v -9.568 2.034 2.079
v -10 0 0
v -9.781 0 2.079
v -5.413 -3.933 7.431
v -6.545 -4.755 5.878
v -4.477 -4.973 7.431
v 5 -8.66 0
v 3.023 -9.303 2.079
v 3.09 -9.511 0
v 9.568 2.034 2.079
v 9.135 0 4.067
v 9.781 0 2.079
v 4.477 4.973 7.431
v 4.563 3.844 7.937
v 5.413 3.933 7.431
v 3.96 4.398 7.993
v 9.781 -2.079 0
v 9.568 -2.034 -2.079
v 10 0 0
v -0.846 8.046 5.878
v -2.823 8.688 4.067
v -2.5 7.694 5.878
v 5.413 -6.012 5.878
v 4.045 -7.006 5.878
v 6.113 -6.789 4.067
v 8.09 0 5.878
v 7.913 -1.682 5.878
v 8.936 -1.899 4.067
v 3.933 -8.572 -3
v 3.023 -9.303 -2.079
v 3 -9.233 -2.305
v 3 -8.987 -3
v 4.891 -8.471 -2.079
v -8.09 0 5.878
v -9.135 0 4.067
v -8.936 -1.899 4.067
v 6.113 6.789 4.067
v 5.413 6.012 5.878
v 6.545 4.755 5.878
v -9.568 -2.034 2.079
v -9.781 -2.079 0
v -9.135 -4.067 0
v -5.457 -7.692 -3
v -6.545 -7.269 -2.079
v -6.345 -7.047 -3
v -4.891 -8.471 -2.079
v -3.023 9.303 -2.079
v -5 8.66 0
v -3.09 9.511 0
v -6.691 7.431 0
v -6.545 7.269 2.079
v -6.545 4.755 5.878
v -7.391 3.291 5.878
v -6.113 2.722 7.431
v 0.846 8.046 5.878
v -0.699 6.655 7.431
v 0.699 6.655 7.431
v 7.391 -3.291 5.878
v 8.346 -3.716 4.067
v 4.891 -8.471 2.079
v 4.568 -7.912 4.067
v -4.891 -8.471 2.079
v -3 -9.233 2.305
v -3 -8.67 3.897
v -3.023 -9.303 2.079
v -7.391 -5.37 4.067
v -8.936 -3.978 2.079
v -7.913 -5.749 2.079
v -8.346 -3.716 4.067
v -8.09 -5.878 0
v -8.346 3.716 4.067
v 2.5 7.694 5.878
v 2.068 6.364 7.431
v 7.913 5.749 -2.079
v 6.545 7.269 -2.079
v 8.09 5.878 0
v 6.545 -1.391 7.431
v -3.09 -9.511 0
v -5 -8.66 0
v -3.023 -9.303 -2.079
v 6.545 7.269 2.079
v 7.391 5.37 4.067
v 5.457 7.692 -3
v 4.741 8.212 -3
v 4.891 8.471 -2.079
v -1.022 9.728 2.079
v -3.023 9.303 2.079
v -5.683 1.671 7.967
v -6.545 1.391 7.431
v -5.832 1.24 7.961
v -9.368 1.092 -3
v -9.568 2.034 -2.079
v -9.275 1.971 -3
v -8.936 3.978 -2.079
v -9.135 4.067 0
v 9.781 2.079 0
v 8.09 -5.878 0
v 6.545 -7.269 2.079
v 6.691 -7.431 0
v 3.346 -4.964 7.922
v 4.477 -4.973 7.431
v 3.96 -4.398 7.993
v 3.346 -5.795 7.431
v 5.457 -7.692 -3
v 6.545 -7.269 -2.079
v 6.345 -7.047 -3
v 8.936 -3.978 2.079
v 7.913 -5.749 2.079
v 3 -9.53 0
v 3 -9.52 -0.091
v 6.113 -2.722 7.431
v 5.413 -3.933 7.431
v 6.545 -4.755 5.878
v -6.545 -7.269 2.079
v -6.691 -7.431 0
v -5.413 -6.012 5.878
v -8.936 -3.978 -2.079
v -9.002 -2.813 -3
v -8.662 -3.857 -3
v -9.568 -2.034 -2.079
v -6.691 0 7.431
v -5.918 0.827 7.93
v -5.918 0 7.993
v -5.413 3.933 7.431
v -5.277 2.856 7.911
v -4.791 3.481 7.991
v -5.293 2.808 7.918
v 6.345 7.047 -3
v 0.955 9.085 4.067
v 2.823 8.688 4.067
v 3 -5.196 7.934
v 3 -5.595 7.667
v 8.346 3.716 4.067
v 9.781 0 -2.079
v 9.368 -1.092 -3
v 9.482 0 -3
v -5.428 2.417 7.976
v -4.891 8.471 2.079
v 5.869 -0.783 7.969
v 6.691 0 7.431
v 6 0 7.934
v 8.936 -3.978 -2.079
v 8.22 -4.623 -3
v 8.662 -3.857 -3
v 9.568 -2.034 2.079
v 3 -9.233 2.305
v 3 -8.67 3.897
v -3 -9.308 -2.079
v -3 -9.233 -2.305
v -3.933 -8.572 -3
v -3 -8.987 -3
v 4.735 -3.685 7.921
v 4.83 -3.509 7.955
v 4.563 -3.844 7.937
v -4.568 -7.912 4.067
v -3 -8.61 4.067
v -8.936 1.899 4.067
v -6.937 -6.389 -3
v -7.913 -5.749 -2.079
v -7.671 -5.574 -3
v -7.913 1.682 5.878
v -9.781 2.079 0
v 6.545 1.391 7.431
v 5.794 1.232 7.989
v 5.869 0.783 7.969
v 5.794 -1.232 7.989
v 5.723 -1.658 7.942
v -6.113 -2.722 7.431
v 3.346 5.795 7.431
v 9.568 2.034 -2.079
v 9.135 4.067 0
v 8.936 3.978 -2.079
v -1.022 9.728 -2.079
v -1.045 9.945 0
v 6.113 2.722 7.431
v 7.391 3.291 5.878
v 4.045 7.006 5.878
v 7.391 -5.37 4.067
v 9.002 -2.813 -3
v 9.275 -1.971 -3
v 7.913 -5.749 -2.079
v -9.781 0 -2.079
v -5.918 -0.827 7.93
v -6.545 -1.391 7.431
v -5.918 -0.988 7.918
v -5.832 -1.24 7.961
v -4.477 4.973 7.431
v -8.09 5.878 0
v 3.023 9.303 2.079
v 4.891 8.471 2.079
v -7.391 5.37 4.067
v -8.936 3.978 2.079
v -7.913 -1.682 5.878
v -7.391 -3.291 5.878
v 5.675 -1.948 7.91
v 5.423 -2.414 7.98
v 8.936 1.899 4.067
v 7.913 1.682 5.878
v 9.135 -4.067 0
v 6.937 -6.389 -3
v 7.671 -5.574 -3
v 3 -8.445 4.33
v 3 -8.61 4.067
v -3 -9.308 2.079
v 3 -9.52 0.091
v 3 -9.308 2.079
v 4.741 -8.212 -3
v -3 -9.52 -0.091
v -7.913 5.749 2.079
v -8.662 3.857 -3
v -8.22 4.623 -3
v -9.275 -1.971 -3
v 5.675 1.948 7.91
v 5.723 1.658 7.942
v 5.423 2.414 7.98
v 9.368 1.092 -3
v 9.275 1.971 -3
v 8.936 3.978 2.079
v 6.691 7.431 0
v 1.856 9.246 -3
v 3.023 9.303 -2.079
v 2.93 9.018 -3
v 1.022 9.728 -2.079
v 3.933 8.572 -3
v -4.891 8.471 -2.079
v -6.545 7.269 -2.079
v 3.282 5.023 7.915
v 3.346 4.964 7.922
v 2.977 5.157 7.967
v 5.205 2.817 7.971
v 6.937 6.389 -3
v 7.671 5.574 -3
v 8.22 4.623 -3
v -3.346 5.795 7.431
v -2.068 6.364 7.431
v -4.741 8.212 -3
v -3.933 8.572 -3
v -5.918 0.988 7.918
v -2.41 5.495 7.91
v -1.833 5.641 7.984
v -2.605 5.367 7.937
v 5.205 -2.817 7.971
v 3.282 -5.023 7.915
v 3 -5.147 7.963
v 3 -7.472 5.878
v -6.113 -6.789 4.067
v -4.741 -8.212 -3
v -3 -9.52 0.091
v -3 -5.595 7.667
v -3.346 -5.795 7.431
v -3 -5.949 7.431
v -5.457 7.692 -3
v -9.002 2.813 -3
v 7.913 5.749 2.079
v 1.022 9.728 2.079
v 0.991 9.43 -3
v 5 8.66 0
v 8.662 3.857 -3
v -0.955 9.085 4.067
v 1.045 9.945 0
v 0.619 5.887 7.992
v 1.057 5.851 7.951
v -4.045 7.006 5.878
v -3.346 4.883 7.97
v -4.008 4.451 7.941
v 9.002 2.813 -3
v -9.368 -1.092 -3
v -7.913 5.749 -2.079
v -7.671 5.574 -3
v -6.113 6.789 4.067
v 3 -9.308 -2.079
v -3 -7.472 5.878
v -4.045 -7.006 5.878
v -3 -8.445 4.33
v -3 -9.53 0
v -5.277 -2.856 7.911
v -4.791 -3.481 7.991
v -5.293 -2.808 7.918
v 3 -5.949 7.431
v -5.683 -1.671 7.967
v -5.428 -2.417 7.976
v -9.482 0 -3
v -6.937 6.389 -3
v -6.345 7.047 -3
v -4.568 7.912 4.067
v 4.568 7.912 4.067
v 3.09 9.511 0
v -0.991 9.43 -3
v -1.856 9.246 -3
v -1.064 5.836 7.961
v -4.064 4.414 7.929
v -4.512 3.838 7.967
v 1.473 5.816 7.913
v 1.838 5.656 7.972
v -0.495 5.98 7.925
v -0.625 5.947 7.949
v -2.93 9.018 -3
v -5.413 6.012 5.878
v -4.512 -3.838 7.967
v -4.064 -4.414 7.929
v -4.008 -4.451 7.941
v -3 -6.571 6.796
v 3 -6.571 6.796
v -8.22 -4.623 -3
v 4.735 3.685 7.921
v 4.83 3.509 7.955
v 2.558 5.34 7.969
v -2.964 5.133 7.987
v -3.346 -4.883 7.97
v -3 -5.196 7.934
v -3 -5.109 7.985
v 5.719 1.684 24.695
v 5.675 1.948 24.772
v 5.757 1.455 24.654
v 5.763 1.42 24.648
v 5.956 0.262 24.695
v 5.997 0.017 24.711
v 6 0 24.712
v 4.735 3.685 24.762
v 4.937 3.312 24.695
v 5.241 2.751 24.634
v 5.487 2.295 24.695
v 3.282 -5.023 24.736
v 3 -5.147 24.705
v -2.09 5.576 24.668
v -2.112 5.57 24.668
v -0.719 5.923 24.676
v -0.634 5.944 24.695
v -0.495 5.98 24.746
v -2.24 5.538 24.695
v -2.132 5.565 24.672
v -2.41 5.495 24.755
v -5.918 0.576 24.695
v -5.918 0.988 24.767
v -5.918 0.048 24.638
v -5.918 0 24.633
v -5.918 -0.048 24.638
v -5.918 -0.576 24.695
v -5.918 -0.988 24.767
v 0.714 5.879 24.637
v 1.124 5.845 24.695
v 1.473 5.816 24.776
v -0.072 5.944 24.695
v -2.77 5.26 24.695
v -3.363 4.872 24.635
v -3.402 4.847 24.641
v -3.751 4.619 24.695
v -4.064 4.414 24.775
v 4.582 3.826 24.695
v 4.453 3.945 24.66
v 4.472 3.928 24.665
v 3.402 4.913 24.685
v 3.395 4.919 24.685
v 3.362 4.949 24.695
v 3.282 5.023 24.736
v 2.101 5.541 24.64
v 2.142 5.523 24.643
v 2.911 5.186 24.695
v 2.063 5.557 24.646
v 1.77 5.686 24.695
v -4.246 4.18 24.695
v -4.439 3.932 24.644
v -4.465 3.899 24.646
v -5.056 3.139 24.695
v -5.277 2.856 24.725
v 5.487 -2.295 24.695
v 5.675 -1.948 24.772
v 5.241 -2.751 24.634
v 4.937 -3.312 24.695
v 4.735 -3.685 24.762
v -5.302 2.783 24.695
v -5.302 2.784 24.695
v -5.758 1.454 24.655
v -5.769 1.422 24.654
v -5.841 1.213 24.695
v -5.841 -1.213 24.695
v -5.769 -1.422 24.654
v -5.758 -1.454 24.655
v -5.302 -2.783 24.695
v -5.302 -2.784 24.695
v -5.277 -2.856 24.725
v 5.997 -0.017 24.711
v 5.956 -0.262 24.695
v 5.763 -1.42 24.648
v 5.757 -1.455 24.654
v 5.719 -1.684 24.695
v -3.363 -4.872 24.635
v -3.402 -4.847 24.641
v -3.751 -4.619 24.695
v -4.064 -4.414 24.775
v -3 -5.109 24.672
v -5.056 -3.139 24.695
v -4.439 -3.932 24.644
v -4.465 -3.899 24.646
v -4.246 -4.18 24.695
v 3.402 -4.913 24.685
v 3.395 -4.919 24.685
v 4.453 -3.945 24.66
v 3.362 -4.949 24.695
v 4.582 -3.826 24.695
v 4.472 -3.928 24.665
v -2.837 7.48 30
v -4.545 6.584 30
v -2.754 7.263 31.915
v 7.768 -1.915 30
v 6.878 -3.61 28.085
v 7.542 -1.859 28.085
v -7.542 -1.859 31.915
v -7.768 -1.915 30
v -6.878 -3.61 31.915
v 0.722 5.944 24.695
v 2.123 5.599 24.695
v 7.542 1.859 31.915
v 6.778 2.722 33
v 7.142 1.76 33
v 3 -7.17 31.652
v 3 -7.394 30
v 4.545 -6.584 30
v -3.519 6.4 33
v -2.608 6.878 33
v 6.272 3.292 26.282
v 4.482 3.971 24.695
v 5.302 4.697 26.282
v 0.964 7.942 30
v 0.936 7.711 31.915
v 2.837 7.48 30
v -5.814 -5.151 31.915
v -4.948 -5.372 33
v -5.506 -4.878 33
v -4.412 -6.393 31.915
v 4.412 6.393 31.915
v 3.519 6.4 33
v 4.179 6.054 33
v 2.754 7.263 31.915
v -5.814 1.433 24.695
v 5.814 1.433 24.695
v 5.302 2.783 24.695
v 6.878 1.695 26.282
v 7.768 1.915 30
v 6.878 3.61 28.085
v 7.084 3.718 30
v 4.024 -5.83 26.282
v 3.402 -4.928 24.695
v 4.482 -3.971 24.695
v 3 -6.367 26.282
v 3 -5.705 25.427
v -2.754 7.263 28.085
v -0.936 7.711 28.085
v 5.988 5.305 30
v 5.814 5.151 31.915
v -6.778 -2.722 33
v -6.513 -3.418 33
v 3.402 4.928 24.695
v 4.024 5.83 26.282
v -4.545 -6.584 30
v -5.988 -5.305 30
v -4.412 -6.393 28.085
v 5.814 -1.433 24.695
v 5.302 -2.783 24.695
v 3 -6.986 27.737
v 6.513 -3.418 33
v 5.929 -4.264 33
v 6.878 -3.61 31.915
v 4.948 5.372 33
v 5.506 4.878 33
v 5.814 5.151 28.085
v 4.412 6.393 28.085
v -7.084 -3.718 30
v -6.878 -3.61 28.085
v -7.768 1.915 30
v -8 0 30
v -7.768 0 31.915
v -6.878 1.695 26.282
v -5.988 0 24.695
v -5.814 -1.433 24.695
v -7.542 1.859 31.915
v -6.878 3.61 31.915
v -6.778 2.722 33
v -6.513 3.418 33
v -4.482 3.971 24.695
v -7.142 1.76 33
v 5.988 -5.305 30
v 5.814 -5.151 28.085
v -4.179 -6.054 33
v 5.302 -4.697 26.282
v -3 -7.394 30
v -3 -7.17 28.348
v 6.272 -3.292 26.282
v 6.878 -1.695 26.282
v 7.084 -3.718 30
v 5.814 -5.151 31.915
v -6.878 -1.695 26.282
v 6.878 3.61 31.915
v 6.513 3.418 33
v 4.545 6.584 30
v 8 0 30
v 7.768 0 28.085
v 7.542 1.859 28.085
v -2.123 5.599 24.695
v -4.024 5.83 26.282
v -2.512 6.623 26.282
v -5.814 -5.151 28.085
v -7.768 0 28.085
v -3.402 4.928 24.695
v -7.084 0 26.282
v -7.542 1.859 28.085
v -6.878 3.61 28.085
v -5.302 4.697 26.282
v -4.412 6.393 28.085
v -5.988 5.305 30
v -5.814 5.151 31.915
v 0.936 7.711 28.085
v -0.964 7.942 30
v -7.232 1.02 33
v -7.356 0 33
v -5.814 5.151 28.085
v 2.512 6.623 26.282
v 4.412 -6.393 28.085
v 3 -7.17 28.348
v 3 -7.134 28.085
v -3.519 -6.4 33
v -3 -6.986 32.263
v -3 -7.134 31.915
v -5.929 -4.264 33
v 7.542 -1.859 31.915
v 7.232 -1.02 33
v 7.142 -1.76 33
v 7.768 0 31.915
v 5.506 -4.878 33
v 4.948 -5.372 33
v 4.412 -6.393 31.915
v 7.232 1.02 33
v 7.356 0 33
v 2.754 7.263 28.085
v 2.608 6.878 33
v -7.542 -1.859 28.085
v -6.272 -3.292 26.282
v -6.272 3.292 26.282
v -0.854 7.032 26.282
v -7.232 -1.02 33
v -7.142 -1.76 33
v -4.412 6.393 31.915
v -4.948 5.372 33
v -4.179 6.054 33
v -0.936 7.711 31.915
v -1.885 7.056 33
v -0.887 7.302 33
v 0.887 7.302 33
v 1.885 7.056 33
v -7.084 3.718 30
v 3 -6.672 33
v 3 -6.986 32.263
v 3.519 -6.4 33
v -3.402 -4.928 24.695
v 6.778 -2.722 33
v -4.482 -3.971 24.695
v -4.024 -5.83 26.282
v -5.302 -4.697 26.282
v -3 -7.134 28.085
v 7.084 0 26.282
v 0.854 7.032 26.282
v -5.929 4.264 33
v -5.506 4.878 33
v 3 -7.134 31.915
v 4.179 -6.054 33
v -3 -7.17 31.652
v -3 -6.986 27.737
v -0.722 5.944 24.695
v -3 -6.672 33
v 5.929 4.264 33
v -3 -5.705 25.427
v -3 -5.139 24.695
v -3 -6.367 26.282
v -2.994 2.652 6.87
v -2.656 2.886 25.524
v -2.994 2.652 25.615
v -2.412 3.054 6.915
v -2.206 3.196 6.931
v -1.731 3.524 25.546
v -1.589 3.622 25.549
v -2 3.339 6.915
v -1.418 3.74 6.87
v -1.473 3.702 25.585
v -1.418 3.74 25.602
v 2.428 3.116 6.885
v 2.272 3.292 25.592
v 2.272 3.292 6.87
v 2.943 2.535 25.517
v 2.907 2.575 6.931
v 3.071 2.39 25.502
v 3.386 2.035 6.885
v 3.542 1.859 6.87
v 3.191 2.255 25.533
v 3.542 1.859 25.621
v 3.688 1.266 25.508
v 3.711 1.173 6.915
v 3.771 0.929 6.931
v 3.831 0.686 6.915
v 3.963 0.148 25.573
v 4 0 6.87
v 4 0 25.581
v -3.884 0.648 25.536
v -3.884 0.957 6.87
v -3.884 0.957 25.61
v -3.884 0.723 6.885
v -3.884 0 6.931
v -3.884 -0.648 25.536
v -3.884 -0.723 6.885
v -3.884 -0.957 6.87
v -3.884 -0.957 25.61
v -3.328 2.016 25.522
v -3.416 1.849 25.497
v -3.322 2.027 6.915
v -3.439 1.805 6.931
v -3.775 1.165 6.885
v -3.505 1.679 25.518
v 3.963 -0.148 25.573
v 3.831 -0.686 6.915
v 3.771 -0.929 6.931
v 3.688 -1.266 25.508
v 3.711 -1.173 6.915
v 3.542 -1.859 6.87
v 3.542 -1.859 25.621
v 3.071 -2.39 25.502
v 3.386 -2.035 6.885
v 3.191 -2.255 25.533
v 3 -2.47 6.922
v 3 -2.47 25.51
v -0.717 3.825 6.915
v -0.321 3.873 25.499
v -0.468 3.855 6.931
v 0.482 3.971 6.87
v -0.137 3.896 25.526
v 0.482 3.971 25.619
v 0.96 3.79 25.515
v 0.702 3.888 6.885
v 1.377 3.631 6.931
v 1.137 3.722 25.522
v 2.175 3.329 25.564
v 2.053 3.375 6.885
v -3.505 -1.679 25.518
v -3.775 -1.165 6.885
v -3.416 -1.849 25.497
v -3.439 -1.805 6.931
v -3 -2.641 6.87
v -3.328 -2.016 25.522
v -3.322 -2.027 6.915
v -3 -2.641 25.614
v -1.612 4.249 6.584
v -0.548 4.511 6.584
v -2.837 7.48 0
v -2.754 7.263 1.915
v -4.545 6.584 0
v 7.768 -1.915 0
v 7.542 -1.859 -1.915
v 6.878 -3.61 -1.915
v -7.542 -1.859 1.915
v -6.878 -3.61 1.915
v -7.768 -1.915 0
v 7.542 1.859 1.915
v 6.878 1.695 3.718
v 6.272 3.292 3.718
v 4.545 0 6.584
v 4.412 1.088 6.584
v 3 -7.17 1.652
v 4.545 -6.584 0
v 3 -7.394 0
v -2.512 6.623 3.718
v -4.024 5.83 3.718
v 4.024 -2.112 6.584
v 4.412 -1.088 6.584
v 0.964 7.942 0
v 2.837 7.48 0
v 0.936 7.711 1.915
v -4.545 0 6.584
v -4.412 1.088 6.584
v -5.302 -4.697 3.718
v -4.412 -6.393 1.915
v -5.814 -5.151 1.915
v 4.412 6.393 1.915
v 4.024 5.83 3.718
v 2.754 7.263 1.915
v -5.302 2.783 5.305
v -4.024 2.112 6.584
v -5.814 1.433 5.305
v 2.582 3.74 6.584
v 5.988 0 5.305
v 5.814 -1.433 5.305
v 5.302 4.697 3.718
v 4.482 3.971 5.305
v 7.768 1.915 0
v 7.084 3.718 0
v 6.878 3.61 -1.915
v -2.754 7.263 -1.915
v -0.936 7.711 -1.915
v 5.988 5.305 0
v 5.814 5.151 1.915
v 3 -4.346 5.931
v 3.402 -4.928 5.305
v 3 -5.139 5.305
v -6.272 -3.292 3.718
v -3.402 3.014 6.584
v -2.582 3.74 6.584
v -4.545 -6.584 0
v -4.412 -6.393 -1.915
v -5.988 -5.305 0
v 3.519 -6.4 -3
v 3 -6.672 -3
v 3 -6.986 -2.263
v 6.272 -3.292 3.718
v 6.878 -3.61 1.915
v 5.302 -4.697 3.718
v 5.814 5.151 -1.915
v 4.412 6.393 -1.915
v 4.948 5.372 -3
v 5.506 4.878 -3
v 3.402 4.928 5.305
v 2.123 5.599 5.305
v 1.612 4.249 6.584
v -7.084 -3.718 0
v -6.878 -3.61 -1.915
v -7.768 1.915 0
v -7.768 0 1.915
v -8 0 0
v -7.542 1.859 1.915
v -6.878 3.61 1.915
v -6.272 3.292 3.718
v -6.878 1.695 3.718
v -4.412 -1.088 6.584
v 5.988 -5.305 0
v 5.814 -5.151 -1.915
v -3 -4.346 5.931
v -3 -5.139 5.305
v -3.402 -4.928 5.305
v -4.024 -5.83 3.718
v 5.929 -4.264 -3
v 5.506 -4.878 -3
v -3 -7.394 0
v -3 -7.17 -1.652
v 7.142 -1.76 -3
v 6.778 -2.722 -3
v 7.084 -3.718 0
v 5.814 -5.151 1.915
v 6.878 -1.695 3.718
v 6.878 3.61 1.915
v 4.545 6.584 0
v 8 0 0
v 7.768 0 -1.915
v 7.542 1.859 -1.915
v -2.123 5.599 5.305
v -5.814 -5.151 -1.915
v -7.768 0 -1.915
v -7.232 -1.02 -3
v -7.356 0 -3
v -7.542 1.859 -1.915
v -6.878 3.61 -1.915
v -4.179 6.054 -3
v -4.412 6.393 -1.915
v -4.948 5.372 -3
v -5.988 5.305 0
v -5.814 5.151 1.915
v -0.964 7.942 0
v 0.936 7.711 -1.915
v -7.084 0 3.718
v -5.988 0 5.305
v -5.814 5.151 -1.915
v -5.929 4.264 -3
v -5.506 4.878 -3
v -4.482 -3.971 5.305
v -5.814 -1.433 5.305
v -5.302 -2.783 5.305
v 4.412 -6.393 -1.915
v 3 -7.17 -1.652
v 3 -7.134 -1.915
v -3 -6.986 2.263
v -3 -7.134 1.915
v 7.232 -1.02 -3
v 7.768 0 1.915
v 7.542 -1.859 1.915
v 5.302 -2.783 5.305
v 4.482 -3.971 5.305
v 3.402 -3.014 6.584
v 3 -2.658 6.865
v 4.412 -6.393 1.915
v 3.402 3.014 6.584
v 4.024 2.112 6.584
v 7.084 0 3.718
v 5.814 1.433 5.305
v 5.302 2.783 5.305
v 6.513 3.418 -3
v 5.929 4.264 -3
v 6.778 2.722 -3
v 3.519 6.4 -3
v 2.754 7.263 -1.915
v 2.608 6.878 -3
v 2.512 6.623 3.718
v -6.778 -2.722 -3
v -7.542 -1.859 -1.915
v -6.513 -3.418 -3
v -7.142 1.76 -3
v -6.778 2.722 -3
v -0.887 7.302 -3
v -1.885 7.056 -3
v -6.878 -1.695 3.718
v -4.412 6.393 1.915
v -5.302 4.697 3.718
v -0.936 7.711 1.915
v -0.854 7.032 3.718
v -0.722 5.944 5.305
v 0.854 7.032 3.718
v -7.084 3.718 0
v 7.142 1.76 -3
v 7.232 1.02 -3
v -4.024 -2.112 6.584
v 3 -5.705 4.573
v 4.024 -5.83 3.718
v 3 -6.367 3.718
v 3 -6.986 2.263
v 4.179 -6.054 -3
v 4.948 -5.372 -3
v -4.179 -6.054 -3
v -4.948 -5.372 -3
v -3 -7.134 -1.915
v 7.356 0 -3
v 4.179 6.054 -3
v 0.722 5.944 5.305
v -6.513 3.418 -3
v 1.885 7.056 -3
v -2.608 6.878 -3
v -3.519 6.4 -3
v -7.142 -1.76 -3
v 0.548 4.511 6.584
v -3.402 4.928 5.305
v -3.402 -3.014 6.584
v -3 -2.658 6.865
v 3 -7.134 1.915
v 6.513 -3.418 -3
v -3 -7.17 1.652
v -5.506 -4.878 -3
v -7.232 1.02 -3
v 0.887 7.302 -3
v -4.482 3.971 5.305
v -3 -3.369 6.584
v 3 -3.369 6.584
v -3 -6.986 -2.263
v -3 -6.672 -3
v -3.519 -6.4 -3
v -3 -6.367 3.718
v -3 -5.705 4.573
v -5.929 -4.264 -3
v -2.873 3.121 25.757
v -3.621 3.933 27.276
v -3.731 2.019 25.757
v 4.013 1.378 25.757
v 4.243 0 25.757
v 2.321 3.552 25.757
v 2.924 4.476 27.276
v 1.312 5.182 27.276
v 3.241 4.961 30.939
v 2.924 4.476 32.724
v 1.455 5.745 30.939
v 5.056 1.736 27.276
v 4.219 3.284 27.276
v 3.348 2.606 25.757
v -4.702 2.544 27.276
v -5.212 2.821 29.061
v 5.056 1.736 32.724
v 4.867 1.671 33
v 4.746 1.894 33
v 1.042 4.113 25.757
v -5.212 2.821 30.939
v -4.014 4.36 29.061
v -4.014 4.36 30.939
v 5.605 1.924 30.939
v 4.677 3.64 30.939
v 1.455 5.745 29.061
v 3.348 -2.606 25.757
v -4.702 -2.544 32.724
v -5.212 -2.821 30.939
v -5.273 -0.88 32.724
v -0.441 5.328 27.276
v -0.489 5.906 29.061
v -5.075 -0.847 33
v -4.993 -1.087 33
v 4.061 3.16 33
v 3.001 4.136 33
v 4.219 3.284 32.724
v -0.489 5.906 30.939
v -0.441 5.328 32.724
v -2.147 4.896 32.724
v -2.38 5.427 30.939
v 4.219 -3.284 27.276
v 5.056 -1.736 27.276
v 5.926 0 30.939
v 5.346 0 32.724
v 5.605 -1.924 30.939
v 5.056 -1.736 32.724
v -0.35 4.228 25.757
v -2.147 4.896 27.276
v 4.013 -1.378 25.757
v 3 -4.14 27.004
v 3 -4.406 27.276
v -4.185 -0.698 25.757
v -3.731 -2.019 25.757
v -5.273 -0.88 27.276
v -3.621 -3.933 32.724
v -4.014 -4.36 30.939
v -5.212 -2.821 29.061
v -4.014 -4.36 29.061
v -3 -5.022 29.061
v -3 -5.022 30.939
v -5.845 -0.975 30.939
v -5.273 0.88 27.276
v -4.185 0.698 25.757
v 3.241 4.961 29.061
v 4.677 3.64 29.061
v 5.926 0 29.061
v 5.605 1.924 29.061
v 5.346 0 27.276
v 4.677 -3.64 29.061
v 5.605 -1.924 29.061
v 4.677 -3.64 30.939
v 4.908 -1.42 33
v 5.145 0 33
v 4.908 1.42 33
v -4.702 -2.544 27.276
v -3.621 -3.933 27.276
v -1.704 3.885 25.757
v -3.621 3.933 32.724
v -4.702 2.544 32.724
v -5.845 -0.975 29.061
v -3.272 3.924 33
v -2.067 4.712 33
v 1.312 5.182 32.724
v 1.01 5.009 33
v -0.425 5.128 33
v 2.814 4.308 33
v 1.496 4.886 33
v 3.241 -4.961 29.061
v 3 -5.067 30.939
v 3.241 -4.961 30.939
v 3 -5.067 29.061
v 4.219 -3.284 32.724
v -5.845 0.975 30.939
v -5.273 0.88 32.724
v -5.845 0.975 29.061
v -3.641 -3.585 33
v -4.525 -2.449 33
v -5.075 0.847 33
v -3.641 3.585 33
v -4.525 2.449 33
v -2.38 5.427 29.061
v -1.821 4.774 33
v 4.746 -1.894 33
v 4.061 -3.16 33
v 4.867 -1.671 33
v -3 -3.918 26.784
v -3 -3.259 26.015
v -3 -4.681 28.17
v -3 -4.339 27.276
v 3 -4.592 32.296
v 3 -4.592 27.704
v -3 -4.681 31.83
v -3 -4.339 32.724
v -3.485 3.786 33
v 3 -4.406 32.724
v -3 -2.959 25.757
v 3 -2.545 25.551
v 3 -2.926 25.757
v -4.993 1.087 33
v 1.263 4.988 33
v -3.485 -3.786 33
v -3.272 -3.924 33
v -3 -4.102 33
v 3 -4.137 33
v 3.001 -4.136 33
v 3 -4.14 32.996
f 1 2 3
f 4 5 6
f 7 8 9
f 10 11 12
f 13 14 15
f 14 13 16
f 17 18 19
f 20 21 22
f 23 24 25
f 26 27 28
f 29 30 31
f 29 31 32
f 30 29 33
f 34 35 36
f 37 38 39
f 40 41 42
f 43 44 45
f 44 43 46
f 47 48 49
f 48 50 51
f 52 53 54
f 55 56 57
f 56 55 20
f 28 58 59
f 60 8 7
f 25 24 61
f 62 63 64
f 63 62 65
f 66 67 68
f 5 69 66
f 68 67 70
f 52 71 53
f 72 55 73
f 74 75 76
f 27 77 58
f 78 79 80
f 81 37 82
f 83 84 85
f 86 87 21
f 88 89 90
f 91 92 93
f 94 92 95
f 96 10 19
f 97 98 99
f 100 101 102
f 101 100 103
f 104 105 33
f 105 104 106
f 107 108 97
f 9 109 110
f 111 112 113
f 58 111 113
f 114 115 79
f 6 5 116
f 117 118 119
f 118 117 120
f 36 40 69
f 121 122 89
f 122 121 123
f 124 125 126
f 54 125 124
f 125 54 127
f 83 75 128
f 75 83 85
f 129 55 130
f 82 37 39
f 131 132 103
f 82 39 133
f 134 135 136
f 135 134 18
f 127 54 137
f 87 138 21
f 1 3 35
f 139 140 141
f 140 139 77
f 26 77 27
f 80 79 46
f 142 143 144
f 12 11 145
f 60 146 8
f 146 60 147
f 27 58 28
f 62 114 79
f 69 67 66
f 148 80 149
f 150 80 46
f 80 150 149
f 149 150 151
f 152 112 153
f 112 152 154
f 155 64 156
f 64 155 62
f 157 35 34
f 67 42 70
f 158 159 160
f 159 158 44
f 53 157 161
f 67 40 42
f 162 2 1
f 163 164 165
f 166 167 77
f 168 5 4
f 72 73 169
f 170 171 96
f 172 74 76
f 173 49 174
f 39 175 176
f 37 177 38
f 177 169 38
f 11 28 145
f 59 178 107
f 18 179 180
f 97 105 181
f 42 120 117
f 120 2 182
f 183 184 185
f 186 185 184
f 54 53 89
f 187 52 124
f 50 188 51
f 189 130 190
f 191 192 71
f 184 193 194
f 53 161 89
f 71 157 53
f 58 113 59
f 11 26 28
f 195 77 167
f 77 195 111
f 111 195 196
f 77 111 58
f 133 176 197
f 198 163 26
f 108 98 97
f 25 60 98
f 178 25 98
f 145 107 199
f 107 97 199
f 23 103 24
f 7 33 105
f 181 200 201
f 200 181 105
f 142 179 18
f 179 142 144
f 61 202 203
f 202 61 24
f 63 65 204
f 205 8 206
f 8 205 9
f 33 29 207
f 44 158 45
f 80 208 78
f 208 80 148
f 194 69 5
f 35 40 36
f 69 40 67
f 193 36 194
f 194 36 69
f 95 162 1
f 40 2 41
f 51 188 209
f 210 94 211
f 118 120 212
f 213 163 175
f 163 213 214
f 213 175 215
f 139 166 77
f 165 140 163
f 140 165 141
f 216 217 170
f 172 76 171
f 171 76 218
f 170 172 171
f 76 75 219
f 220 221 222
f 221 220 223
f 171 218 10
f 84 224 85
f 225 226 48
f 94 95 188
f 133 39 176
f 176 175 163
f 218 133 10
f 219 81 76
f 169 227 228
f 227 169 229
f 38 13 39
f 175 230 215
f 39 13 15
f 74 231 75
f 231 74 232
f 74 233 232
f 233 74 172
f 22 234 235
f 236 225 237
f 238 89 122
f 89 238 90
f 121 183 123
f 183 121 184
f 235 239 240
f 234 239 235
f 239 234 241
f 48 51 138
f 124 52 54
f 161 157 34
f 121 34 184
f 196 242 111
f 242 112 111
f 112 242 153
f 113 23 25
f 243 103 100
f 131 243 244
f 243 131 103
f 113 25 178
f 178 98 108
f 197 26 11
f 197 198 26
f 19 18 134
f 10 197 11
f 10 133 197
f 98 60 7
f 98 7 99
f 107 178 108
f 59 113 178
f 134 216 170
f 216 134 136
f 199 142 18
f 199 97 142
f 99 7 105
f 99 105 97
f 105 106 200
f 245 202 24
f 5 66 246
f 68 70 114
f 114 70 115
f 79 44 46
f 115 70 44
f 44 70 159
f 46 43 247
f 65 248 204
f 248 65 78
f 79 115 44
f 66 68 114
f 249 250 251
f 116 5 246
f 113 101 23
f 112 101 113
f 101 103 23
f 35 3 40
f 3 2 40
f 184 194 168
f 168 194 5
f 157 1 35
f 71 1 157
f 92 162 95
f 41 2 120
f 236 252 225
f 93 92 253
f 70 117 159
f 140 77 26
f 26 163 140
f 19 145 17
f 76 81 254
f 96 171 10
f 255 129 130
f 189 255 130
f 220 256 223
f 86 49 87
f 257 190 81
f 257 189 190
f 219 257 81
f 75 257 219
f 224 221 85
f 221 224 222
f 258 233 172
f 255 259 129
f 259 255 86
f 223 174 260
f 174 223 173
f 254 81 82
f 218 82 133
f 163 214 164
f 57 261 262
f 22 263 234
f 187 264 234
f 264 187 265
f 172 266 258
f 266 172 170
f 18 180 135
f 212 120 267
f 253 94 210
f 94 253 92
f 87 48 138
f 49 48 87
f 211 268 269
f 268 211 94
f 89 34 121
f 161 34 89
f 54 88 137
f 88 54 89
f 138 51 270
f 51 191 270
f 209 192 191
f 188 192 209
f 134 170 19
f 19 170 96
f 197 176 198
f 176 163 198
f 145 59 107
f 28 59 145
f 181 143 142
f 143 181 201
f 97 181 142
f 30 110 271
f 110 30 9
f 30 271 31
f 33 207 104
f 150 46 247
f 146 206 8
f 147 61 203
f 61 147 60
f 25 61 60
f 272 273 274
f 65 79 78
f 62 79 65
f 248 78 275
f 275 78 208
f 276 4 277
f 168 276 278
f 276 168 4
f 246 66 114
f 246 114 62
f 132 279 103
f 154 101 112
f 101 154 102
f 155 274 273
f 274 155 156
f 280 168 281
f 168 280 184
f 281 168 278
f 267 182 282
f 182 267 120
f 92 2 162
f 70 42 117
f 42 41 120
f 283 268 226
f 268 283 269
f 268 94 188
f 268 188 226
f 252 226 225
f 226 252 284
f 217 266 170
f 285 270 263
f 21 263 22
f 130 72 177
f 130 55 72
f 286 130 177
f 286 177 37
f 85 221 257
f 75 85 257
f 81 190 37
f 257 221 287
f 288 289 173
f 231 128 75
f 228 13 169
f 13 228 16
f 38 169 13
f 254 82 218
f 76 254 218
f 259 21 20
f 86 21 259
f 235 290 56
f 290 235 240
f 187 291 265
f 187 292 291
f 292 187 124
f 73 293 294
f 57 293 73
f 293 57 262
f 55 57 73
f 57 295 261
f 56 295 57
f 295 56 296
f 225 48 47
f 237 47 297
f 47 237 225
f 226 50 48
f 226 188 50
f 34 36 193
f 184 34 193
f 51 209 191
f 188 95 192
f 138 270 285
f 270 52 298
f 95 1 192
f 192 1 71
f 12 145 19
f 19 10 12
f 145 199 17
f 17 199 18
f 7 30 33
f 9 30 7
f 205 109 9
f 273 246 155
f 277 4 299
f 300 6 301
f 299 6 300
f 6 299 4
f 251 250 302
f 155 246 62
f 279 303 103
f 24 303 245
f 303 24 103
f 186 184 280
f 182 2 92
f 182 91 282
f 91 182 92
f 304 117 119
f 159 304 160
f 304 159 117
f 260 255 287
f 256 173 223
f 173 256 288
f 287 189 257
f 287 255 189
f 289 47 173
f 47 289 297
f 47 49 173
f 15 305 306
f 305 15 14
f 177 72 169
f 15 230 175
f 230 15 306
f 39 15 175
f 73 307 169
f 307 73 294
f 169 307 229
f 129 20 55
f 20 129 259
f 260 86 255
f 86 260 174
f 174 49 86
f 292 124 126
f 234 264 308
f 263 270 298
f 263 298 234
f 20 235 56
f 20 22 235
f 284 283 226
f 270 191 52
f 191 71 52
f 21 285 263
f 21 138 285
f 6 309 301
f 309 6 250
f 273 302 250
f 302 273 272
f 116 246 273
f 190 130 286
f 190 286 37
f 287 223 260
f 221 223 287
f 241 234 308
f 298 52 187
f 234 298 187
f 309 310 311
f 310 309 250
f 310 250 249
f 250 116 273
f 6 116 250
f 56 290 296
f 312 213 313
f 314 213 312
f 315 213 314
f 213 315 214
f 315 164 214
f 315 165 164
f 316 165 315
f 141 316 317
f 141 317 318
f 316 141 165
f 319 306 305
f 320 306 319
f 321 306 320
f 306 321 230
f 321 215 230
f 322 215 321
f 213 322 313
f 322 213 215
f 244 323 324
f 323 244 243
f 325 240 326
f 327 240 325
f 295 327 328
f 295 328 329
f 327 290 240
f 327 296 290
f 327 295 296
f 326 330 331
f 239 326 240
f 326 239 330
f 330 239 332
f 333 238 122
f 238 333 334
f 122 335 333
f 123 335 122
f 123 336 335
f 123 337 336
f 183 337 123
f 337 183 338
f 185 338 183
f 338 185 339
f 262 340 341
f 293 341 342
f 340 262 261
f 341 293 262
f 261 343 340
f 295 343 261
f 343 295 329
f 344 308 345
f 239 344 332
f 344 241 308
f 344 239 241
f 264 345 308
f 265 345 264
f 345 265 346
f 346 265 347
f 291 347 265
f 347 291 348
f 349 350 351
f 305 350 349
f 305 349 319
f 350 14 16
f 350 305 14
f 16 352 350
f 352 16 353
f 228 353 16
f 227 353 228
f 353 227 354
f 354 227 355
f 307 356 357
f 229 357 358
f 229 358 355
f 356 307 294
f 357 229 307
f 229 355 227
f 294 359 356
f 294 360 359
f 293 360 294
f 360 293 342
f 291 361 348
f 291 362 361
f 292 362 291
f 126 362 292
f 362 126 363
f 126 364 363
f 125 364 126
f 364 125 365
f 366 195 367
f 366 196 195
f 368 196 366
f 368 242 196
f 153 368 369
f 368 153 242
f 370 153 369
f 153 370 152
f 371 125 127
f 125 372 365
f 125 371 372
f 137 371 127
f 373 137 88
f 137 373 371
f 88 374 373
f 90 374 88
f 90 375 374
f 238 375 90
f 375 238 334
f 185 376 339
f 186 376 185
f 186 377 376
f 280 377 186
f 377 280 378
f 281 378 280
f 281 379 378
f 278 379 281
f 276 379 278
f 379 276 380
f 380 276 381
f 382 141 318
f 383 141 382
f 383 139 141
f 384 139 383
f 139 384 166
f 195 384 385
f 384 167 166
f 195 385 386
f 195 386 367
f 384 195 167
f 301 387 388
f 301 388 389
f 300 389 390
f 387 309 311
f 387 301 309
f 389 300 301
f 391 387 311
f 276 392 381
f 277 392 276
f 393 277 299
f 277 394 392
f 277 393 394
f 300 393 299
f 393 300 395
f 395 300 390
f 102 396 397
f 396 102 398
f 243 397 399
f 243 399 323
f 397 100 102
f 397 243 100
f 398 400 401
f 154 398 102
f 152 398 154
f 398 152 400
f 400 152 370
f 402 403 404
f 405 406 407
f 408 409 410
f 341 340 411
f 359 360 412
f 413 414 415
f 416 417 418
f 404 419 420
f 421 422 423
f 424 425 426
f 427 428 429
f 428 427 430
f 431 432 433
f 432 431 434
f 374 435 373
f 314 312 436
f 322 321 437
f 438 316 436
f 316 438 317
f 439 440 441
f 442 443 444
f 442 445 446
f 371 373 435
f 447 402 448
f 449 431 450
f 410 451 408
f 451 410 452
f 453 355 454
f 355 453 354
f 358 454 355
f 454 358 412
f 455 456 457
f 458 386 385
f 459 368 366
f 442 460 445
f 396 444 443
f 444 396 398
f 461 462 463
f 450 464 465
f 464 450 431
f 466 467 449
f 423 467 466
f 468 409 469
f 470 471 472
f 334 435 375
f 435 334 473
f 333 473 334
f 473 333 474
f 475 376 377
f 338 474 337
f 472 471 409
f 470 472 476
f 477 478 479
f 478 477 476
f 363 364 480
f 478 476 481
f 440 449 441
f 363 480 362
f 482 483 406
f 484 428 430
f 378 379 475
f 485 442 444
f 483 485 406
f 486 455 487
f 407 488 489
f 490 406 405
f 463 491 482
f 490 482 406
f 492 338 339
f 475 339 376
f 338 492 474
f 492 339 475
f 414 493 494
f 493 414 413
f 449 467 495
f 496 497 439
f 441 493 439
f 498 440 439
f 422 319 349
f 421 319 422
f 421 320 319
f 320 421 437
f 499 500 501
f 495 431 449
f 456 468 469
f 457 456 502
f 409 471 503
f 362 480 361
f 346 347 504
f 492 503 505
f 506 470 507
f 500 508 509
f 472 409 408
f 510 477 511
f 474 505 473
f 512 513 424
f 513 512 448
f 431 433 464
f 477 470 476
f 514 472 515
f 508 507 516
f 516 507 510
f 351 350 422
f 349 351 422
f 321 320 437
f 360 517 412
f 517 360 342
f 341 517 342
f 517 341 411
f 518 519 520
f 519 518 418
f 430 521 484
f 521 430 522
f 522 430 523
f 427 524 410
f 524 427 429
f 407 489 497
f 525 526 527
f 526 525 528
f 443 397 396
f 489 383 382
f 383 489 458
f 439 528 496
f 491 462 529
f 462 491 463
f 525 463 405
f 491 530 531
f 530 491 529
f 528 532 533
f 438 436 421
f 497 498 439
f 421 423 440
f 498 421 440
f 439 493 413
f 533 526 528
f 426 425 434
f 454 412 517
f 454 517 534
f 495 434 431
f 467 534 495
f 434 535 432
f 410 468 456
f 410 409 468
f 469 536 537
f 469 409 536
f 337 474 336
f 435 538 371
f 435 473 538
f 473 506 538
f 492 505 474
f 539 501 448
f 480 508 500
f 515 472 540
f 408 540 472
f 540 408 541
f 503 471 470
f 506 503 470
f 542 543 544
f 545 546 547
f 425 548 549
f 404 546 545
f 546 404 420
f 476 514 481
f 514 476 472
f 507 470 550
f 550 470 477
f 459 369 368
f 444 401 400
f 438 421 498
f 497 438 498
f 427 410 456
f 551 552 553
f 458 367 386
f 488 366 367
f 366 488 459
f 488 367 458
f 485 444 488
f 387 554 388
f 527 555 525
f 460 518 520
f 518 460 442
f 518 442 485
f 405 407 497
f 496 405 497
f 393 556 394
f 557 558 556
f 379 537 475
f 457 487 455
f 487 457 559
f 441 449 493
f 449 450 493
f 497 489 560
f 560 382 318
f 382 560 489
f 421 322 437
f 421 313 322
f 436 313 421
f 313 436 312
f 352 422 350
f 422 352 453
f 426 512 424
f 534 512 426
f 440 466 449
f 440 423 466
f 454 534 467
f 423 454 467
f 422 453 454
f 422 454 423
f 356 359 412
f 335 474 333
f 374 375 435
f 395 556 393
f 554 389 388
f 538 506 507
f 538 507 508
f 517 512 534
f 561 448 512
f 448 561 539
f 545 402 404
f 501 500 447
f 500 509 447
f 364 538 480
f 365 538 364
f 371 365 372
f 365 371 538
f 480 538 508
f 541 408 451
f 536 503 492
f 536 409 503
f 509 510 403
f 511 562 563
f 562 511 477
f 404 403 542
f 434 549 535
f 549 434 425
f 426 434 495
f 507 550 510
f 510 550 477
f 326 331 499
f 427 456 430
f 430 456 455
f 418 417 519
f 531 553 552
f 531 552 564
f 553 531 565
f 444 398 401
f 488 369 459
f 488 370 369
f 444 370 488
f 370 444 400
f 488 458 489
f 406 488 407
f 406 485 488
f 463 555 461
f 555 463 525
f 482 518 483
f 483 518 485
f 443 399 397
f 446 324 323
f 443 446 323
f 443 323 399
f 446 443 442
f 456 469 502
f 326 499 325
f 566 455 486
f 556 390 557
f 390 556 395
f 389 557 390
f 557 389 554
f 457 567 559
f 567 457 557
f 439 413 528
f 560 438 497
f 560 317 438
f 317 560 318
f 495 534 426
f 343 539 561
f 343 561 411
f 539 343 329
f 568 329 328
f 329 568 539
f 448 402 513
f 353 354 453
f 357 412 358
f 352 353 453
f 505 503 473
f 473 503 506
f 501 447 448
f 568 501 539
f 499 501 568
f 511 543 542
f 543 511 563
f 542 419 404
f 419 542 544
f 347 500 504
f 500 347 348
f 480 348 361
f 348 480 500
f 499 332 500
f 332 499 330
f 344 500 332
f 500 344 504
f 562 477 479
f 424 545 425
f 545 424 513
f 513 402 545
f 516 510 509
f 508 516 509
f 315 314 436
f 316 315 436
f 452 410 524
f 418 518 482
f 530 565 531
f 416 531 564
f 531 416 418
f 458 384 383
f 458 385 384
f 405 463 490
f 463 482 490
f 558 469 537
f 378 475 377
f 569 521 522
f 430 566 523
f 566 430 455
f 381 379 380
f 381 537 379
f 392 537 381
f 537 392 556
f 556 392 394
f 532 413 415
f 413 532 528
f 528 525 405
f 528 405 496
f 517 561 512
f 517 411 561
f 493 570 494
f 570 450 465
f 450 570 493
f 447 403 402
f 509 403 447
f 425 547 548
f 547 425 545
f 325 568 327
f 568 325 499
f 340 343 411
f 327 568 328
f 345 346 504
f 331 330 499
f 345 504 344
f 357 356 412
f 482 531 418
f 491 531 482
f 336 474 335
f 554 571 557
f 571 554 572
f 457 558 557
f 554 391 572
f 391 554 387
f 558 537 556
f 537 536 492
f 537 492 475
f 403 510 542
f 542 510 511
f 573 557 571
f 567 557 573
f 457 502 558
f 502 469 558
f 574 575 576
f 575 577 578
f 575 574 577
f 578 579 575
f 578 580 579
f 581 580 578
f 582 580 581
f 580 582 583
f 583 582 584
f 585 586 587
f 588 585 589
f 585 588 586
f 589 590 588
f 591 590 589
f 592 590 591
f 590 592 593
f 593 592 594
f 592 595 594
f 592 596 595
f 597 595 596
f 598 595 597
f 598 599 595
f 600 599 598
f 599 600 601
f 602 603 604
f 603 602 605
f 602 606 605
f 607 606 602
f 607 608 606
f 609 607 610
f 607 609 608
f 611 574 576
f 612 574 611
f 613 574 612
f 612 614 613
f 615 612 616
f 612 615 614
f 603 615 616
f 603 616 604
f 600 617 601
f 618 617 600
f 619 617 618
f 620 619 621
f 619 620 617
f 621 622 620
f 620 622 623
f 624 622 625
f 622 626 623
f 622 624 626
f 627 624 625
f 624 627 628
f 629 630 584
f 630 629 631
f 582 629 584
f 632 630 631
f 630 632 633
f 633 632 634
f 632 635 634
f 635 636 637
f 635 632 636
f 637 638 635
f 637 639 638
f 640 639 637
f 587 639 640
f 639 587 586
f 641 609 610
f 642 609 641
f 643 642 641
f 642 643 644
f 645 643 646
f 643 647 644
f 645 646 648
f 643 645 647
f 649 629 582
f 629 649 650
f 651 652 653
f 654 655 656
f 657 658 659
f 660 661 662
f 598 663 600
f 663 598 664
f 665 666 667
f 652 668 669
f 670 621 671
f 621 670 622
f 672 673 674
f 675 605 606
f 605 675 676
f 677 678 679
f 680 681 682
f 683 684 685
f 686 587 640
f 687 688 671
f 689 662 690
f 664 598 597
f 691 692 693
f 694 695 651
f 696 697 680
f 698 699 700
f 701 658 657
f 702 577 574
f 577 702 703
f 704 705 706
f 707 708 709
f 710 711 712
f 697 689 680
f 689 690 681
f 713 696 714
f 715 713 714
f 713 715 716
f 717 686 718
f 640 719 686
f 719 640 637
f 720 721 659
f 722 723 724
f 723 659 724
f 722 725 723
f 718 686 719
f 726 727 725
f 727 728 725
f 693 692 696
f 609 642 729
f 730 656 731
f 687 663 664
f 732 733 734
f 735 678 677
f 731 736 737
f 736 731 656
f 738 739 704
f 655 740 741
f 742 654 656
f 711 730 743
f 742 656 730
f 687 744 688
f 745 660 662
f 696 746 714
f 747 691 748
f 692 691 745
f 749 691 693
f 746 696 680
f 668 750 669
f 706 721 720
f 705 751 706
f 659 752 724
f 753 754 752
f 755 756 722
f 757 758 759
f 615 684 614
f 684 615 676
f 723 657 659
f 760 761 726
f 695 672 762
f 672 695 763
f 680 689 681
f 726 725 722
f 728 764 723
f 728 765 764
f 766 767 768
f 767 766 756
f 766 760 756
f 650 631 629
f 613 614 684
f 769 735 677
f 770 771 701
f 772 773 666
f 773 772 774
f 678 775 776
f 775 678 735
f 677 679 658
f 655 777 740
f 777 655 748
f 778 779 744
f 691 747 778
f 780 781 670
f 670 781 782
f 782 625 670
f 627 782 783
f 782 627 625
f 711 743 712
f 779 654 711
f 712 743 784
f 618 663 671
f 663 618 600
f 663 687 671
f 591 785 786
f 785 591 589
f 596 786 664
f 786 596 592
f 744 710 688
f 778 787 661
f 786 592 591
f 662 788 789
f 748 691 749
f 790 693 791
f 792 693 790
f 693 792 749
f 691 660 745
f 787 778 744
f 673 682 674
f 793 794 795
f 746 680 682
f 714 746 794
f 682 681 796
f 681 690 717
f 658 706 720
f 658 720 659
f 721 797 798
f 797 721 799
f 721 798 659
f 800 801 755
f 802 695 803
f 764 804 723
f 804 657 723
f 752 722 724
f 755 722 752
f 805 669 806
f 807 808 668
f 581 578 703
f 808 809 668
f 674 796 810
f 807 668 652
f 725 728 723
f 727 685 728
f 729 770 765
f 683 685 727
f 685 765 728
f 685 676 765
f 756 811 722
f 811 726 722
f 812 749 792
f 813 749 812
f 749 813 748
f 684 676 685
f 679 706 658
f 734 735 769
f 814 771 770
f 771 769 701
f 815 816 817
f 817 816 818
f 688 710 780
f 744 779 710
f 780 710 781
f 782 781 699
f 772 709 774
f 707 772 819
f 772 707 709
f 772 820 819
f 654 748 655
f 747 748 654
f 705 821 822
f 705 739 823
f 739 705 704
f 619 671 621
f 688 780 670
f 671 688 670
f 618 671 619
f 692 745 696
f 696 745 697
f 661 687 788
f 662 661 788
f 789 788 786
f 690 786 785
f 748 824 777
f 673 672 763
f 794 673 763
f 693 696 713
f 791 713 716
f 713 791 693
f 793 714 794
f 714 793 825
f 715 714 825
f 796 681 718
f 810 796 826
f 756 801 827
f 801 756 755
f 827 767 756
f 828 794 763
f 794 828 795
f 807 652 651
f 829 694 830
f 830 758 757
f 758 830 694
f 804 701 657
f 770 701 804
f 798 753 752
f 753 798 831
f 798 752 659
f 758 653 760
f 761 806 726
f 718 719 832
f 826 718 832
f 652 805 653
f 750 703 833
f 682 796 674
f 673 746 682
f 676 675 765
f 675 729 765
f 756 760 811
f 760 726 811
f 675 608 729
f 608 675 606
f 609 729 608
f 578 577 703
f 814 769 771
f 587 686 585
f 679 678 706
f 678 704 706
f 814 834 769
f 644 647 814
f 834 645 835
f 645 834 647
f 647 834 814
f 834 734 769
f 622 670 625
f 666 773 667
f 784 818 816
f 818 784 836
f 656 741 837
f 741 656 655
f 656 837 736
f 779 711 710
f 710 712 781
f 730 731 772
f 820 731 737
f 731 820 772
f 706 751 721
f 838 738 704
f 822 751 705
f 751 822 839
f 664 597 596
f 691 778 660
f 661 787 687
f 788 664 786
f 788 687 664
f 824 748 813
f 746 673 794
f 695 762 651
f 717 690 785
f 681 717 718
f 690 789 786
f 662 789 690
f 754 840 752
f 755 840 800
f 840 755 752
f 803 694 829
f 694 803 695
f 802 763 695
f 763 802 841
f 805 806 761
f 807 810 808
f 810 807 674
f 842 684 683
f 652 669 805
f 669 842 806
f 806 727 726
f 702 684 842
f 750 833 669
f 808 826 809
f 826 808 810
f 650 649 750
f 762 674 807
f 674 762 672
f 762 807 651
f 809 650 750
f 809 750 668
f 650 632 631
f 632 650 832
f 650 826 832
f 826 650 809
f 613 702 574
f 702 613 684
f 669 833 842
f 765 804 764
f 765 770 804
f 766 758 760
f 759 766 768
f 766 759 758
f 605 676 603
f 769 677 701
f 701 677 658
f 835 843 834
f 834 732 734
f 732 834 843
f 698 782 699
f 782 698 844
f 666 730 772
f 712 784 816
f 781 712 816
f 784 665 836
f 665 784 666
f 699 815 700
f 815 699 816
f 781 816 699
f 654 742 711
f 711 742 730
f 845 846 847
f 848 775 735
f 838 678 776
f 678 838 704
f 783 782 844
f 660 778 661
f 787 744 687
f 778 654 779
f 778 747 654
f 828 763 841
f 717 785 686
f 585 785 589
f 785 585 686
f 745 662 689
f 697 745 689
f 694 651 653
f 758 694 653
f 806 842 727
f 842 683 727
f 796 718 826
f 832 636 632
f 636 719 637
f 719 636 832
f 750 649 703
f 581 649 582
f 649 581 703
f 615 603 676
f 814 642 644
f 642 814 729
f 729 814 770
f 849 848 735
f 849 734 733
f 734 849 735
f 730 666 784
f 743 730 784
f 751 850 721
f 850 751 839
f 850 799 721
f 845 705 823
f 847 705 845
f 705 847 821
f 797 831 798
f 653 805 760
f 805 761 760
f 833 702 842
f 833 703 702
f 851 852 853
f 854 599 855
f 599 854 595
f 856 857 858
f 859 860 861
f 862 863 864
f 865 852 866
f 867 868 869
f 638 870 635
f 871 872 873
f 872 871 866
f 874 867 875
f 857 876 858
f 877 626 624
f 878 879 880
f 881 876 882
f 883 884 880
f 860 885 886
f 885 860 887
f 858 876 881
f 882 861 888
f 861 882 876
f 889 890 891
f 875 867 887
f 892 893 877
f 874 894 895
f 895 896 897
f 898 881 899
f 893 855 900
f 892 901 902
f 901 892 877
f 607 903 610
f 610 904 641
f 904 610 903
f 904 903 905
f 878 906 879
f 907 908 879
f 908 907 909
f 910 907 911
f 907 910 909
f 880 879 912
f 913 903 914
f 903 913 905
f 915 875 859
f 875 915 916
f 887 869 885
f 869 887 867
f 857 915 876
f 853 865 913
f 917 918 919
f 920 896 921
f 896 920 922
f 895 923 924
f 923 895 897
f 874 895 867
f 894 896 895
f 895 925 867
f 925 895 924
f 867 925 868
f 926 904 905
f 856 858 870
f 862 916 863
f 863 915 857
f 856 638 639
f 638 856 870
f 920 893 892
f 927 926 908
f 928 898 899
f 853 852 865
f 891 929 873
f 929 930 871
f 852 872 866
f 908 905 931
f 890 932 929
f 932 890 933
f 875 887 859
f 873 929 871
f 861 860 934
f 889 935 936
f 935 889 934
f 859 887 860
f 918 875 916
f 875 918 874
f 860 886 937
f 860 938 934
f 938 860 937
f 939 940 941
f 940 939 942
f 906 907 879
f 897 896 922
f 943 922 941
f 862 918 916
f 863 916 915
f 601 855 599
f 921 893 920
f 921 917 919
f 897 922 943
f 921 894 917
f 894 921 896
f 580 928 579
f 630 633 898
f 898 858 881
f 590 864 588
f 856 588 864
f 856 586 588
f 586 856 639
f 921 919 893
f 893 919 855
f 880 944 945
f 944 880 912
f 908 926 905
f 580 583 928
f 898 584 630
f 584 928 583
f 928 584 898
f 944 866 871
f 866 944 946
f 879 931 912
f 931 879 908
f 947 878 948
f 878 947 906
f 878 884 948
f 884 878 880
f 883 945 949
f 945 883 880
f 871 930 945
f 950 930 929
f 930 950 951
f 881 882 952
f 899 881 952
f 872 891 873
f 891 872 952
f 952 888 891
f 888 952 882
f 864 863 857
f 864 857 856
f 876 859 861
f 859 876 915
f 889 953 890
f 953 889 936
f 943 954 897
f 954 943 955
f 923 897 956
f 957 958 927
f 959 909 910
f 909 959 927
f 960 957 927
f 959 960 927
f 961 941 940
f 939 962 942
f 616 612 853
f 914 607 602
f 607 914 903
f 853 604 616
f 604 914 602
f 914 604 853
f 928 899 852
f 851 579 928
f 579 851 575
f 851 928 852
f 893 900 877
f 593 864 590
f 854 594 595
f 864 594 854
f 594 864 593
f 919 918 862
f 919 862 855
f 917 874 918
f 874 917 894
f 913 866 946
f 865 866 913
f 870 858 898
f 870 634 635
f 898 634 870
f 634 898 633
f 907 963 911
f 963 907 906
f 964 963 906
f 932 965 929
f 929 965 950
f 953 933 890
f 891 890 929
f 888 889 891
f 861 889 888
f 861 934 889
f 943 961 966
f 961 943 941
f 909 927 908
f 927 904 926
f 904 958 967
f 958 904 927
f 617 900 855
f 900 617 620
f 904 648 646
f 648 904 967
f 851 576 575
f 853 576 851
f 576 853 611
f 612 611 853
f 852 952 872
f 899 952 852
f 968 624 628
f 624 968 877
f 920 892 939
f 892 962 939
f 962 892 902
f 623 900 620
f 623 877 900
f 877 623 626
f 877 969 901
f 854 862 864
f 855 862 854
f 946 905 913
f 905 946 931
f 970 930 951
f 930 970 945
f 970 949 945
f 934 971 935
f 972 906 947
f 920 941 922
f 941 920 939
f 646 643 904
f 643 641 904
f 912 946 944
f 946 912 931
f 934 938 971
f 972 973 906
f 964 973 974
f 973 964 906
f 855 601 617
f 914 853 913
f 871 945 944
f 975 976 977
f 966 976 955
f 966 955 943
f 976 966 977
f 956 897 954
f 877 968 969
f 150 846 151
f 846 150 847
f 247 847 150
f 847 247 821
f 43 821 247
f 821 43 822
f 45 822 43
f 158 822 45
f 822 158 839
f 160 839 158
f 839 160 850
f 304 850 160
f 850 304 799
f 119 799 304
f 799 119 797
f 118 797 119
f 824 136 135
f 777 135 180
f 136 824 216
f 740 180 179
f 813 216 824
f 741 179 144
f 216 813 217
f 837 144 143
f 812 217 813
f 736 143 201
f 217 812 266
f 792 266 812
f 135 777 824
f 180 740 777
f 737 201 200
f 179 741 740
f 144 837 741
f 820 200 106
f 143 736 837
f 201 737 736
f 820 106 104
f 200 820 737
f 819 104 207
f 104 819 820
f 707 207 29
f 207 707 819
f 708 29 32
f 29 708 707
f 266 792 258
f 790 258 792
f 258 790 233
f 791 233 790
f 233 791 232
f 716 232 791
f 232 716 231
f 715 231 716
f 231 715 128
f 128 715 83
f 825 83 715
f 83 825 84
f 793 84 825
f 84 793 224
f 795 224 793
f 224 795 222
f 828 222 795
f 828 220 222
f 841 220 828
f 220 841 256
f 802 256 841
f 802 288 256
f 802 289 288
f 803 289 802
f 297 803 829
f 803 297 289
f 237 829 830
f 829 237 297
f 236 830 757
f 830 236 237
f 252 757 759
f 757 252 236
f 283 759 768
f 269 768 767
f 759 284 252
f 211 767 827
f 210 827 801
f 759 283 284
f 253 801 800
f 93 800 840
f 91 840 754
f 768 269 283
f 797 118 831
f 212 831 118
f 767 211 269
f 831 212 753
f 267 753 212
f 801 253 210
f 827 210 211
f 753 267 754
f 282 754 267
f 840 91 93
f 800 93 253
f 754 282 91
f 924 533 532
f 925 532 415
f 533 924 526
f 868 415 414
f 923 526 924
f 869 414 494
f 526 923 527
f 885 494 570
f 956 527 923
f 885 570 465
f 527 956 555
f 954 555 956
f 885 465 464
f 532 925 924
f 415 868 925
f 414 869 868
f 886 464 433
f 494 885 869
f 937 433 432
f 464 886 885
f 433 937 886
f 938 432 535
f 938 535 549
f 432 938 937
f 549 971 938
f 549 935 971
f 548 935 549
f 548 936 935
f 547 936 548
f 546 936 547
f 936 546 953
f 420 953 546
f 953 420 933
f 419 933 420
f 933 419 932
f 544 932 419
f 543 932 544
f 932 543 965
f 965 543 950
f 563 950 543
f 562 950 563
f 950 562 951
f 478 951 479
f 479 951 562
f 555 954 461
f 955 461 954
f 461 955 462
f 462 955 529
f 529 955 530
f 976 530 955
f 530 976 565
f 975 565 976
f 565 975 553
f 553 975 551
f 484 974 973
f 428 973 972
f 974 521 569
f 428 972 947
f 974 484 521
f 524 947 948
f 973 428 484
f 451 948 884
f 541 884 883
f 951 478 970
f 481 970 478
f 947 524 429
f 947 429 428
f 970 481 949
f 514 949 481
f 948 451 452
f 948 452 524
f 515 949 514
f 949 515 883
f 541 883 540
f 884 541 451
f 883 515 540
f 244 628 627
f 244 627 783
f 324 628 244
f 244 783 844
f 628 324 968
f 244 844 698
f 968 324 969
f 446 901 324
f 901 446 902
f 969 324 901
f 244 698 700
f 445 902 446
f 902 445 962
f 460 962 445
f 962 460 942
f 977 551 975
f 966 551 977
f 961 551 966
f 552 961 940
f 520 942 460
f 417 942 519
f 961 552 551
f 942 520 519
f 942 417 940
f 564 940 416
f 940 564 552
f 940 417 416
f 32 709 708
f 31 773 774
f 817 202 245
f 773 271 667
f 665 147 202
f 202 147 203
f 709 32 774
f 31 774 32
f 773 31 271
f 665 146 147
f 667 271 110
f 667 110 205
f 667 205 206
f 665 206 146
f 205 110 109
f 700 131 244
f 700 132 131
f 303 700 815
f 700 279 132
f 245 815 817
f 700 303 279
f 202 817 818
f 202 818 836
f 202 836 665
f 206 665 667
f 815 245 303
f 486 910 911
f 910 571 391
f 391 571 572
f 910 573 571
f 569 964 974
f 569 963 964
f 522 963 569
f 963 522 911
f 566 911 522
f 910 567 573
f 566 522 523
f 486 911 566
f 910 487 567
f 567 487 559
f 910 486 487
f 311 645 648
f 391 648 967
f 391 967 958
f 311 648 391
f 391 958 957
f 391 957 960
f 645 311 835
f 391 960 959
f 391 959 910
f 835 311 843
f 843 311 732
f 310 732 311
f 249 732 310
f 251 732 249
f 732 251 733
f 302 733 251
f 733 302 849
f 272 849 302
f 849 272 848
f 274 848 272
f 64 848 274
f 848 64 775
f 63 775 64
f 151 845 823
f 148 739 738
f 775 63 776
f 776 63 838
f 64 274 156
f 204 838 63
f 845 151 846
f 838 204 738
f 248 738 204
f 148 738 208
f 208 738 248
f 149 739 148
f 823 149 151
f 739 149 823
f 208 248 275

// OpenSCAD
// [FL_INDEX: keywords="openscad, 3d_parametric, Customizable_cable_thing, csg_solid" | COT="Parametric OpenSCAD design from 3DCodeverse"]
// Title: Customizable cable thing

//This is the height from the center of the large ball to the cente of the small ball, not the overall height of the object.
//Height of the shaft, not the full object
height=30; //[10:50]

//This is the reidus of the inner pipe (The amount of space you have to run cables.
//Inner Pipe radius
inner_pipe_radius=4;//[2:10] 

//This is the outer raidus of the small joint and the inner raidus of the outter joint.
//Outer joint size of the small ball joint and inner joint size of the large ball joint.
large_joint_inner_radius=8;//[4:12]

// How thick are the walls.
// Thickness of the walls
thickness=2;//[1:5]

difference(){
	union(){
		//The large ball joint, outter
		sphere(large_joint_inner_radius+thickness);

		//The outter shaft
		cylinder(h=height,r=inner_pipe_radius+thickness);

		//The small ball joint, outter
		translate([0,0,height]) sphere(large_joint_inner_radius);
	}

	//This cuts the inner pipe.  The place for the cables
	cylinder(h=height,r=inner_pipe_radius);
	
	//This cuts the inner part of the large ball joint
	sphere(large_joint_inner_radius);

	//This cuts the inner part of the small ball joint
	translate([0,0,height]) sphere(large_joint_inner_radius-thickness);

	//This cuts the bottom of the large outter joint
	translate([-large_joint_inner_radius-thickness,-large_joint_inner_radius-thickness,-large_joint_inner_radius-thickness]) cube([(large_joint_inner_radius+thickness)*2,(large_joint_inner_radius+thickness)*2,(large_joint_inner_radius+thickness)*.7]);

	//This cuts the top of the small inner joint.  Needed a little more than calculated.  Needed to be a little more then calculated.
	translate([-large_joint_inner_radius,-large_joint_inner_radius,height+((large_joint_inner_radius+thickness)*.3)]) cube([large_joint_inner_radius*2,large_joint_inner_radius*2,(large_joint_inner_radius*2)]);
	
	//This is the slot
	translate([-inner_pipe_radius+(thickness/2),-large_joint_inner_radius-thickness,-large_joint_inner_radius-thickness]) cube([(inner_pipe_radius*2)-thickness,large_joint_inner_radius+thickness,height+((large_joint_inner_radius+thickness)*2)]) cube([((large_joint_inner_radius+thickness)*.7)+(large_joint_inner_radius*.7)]);
}
